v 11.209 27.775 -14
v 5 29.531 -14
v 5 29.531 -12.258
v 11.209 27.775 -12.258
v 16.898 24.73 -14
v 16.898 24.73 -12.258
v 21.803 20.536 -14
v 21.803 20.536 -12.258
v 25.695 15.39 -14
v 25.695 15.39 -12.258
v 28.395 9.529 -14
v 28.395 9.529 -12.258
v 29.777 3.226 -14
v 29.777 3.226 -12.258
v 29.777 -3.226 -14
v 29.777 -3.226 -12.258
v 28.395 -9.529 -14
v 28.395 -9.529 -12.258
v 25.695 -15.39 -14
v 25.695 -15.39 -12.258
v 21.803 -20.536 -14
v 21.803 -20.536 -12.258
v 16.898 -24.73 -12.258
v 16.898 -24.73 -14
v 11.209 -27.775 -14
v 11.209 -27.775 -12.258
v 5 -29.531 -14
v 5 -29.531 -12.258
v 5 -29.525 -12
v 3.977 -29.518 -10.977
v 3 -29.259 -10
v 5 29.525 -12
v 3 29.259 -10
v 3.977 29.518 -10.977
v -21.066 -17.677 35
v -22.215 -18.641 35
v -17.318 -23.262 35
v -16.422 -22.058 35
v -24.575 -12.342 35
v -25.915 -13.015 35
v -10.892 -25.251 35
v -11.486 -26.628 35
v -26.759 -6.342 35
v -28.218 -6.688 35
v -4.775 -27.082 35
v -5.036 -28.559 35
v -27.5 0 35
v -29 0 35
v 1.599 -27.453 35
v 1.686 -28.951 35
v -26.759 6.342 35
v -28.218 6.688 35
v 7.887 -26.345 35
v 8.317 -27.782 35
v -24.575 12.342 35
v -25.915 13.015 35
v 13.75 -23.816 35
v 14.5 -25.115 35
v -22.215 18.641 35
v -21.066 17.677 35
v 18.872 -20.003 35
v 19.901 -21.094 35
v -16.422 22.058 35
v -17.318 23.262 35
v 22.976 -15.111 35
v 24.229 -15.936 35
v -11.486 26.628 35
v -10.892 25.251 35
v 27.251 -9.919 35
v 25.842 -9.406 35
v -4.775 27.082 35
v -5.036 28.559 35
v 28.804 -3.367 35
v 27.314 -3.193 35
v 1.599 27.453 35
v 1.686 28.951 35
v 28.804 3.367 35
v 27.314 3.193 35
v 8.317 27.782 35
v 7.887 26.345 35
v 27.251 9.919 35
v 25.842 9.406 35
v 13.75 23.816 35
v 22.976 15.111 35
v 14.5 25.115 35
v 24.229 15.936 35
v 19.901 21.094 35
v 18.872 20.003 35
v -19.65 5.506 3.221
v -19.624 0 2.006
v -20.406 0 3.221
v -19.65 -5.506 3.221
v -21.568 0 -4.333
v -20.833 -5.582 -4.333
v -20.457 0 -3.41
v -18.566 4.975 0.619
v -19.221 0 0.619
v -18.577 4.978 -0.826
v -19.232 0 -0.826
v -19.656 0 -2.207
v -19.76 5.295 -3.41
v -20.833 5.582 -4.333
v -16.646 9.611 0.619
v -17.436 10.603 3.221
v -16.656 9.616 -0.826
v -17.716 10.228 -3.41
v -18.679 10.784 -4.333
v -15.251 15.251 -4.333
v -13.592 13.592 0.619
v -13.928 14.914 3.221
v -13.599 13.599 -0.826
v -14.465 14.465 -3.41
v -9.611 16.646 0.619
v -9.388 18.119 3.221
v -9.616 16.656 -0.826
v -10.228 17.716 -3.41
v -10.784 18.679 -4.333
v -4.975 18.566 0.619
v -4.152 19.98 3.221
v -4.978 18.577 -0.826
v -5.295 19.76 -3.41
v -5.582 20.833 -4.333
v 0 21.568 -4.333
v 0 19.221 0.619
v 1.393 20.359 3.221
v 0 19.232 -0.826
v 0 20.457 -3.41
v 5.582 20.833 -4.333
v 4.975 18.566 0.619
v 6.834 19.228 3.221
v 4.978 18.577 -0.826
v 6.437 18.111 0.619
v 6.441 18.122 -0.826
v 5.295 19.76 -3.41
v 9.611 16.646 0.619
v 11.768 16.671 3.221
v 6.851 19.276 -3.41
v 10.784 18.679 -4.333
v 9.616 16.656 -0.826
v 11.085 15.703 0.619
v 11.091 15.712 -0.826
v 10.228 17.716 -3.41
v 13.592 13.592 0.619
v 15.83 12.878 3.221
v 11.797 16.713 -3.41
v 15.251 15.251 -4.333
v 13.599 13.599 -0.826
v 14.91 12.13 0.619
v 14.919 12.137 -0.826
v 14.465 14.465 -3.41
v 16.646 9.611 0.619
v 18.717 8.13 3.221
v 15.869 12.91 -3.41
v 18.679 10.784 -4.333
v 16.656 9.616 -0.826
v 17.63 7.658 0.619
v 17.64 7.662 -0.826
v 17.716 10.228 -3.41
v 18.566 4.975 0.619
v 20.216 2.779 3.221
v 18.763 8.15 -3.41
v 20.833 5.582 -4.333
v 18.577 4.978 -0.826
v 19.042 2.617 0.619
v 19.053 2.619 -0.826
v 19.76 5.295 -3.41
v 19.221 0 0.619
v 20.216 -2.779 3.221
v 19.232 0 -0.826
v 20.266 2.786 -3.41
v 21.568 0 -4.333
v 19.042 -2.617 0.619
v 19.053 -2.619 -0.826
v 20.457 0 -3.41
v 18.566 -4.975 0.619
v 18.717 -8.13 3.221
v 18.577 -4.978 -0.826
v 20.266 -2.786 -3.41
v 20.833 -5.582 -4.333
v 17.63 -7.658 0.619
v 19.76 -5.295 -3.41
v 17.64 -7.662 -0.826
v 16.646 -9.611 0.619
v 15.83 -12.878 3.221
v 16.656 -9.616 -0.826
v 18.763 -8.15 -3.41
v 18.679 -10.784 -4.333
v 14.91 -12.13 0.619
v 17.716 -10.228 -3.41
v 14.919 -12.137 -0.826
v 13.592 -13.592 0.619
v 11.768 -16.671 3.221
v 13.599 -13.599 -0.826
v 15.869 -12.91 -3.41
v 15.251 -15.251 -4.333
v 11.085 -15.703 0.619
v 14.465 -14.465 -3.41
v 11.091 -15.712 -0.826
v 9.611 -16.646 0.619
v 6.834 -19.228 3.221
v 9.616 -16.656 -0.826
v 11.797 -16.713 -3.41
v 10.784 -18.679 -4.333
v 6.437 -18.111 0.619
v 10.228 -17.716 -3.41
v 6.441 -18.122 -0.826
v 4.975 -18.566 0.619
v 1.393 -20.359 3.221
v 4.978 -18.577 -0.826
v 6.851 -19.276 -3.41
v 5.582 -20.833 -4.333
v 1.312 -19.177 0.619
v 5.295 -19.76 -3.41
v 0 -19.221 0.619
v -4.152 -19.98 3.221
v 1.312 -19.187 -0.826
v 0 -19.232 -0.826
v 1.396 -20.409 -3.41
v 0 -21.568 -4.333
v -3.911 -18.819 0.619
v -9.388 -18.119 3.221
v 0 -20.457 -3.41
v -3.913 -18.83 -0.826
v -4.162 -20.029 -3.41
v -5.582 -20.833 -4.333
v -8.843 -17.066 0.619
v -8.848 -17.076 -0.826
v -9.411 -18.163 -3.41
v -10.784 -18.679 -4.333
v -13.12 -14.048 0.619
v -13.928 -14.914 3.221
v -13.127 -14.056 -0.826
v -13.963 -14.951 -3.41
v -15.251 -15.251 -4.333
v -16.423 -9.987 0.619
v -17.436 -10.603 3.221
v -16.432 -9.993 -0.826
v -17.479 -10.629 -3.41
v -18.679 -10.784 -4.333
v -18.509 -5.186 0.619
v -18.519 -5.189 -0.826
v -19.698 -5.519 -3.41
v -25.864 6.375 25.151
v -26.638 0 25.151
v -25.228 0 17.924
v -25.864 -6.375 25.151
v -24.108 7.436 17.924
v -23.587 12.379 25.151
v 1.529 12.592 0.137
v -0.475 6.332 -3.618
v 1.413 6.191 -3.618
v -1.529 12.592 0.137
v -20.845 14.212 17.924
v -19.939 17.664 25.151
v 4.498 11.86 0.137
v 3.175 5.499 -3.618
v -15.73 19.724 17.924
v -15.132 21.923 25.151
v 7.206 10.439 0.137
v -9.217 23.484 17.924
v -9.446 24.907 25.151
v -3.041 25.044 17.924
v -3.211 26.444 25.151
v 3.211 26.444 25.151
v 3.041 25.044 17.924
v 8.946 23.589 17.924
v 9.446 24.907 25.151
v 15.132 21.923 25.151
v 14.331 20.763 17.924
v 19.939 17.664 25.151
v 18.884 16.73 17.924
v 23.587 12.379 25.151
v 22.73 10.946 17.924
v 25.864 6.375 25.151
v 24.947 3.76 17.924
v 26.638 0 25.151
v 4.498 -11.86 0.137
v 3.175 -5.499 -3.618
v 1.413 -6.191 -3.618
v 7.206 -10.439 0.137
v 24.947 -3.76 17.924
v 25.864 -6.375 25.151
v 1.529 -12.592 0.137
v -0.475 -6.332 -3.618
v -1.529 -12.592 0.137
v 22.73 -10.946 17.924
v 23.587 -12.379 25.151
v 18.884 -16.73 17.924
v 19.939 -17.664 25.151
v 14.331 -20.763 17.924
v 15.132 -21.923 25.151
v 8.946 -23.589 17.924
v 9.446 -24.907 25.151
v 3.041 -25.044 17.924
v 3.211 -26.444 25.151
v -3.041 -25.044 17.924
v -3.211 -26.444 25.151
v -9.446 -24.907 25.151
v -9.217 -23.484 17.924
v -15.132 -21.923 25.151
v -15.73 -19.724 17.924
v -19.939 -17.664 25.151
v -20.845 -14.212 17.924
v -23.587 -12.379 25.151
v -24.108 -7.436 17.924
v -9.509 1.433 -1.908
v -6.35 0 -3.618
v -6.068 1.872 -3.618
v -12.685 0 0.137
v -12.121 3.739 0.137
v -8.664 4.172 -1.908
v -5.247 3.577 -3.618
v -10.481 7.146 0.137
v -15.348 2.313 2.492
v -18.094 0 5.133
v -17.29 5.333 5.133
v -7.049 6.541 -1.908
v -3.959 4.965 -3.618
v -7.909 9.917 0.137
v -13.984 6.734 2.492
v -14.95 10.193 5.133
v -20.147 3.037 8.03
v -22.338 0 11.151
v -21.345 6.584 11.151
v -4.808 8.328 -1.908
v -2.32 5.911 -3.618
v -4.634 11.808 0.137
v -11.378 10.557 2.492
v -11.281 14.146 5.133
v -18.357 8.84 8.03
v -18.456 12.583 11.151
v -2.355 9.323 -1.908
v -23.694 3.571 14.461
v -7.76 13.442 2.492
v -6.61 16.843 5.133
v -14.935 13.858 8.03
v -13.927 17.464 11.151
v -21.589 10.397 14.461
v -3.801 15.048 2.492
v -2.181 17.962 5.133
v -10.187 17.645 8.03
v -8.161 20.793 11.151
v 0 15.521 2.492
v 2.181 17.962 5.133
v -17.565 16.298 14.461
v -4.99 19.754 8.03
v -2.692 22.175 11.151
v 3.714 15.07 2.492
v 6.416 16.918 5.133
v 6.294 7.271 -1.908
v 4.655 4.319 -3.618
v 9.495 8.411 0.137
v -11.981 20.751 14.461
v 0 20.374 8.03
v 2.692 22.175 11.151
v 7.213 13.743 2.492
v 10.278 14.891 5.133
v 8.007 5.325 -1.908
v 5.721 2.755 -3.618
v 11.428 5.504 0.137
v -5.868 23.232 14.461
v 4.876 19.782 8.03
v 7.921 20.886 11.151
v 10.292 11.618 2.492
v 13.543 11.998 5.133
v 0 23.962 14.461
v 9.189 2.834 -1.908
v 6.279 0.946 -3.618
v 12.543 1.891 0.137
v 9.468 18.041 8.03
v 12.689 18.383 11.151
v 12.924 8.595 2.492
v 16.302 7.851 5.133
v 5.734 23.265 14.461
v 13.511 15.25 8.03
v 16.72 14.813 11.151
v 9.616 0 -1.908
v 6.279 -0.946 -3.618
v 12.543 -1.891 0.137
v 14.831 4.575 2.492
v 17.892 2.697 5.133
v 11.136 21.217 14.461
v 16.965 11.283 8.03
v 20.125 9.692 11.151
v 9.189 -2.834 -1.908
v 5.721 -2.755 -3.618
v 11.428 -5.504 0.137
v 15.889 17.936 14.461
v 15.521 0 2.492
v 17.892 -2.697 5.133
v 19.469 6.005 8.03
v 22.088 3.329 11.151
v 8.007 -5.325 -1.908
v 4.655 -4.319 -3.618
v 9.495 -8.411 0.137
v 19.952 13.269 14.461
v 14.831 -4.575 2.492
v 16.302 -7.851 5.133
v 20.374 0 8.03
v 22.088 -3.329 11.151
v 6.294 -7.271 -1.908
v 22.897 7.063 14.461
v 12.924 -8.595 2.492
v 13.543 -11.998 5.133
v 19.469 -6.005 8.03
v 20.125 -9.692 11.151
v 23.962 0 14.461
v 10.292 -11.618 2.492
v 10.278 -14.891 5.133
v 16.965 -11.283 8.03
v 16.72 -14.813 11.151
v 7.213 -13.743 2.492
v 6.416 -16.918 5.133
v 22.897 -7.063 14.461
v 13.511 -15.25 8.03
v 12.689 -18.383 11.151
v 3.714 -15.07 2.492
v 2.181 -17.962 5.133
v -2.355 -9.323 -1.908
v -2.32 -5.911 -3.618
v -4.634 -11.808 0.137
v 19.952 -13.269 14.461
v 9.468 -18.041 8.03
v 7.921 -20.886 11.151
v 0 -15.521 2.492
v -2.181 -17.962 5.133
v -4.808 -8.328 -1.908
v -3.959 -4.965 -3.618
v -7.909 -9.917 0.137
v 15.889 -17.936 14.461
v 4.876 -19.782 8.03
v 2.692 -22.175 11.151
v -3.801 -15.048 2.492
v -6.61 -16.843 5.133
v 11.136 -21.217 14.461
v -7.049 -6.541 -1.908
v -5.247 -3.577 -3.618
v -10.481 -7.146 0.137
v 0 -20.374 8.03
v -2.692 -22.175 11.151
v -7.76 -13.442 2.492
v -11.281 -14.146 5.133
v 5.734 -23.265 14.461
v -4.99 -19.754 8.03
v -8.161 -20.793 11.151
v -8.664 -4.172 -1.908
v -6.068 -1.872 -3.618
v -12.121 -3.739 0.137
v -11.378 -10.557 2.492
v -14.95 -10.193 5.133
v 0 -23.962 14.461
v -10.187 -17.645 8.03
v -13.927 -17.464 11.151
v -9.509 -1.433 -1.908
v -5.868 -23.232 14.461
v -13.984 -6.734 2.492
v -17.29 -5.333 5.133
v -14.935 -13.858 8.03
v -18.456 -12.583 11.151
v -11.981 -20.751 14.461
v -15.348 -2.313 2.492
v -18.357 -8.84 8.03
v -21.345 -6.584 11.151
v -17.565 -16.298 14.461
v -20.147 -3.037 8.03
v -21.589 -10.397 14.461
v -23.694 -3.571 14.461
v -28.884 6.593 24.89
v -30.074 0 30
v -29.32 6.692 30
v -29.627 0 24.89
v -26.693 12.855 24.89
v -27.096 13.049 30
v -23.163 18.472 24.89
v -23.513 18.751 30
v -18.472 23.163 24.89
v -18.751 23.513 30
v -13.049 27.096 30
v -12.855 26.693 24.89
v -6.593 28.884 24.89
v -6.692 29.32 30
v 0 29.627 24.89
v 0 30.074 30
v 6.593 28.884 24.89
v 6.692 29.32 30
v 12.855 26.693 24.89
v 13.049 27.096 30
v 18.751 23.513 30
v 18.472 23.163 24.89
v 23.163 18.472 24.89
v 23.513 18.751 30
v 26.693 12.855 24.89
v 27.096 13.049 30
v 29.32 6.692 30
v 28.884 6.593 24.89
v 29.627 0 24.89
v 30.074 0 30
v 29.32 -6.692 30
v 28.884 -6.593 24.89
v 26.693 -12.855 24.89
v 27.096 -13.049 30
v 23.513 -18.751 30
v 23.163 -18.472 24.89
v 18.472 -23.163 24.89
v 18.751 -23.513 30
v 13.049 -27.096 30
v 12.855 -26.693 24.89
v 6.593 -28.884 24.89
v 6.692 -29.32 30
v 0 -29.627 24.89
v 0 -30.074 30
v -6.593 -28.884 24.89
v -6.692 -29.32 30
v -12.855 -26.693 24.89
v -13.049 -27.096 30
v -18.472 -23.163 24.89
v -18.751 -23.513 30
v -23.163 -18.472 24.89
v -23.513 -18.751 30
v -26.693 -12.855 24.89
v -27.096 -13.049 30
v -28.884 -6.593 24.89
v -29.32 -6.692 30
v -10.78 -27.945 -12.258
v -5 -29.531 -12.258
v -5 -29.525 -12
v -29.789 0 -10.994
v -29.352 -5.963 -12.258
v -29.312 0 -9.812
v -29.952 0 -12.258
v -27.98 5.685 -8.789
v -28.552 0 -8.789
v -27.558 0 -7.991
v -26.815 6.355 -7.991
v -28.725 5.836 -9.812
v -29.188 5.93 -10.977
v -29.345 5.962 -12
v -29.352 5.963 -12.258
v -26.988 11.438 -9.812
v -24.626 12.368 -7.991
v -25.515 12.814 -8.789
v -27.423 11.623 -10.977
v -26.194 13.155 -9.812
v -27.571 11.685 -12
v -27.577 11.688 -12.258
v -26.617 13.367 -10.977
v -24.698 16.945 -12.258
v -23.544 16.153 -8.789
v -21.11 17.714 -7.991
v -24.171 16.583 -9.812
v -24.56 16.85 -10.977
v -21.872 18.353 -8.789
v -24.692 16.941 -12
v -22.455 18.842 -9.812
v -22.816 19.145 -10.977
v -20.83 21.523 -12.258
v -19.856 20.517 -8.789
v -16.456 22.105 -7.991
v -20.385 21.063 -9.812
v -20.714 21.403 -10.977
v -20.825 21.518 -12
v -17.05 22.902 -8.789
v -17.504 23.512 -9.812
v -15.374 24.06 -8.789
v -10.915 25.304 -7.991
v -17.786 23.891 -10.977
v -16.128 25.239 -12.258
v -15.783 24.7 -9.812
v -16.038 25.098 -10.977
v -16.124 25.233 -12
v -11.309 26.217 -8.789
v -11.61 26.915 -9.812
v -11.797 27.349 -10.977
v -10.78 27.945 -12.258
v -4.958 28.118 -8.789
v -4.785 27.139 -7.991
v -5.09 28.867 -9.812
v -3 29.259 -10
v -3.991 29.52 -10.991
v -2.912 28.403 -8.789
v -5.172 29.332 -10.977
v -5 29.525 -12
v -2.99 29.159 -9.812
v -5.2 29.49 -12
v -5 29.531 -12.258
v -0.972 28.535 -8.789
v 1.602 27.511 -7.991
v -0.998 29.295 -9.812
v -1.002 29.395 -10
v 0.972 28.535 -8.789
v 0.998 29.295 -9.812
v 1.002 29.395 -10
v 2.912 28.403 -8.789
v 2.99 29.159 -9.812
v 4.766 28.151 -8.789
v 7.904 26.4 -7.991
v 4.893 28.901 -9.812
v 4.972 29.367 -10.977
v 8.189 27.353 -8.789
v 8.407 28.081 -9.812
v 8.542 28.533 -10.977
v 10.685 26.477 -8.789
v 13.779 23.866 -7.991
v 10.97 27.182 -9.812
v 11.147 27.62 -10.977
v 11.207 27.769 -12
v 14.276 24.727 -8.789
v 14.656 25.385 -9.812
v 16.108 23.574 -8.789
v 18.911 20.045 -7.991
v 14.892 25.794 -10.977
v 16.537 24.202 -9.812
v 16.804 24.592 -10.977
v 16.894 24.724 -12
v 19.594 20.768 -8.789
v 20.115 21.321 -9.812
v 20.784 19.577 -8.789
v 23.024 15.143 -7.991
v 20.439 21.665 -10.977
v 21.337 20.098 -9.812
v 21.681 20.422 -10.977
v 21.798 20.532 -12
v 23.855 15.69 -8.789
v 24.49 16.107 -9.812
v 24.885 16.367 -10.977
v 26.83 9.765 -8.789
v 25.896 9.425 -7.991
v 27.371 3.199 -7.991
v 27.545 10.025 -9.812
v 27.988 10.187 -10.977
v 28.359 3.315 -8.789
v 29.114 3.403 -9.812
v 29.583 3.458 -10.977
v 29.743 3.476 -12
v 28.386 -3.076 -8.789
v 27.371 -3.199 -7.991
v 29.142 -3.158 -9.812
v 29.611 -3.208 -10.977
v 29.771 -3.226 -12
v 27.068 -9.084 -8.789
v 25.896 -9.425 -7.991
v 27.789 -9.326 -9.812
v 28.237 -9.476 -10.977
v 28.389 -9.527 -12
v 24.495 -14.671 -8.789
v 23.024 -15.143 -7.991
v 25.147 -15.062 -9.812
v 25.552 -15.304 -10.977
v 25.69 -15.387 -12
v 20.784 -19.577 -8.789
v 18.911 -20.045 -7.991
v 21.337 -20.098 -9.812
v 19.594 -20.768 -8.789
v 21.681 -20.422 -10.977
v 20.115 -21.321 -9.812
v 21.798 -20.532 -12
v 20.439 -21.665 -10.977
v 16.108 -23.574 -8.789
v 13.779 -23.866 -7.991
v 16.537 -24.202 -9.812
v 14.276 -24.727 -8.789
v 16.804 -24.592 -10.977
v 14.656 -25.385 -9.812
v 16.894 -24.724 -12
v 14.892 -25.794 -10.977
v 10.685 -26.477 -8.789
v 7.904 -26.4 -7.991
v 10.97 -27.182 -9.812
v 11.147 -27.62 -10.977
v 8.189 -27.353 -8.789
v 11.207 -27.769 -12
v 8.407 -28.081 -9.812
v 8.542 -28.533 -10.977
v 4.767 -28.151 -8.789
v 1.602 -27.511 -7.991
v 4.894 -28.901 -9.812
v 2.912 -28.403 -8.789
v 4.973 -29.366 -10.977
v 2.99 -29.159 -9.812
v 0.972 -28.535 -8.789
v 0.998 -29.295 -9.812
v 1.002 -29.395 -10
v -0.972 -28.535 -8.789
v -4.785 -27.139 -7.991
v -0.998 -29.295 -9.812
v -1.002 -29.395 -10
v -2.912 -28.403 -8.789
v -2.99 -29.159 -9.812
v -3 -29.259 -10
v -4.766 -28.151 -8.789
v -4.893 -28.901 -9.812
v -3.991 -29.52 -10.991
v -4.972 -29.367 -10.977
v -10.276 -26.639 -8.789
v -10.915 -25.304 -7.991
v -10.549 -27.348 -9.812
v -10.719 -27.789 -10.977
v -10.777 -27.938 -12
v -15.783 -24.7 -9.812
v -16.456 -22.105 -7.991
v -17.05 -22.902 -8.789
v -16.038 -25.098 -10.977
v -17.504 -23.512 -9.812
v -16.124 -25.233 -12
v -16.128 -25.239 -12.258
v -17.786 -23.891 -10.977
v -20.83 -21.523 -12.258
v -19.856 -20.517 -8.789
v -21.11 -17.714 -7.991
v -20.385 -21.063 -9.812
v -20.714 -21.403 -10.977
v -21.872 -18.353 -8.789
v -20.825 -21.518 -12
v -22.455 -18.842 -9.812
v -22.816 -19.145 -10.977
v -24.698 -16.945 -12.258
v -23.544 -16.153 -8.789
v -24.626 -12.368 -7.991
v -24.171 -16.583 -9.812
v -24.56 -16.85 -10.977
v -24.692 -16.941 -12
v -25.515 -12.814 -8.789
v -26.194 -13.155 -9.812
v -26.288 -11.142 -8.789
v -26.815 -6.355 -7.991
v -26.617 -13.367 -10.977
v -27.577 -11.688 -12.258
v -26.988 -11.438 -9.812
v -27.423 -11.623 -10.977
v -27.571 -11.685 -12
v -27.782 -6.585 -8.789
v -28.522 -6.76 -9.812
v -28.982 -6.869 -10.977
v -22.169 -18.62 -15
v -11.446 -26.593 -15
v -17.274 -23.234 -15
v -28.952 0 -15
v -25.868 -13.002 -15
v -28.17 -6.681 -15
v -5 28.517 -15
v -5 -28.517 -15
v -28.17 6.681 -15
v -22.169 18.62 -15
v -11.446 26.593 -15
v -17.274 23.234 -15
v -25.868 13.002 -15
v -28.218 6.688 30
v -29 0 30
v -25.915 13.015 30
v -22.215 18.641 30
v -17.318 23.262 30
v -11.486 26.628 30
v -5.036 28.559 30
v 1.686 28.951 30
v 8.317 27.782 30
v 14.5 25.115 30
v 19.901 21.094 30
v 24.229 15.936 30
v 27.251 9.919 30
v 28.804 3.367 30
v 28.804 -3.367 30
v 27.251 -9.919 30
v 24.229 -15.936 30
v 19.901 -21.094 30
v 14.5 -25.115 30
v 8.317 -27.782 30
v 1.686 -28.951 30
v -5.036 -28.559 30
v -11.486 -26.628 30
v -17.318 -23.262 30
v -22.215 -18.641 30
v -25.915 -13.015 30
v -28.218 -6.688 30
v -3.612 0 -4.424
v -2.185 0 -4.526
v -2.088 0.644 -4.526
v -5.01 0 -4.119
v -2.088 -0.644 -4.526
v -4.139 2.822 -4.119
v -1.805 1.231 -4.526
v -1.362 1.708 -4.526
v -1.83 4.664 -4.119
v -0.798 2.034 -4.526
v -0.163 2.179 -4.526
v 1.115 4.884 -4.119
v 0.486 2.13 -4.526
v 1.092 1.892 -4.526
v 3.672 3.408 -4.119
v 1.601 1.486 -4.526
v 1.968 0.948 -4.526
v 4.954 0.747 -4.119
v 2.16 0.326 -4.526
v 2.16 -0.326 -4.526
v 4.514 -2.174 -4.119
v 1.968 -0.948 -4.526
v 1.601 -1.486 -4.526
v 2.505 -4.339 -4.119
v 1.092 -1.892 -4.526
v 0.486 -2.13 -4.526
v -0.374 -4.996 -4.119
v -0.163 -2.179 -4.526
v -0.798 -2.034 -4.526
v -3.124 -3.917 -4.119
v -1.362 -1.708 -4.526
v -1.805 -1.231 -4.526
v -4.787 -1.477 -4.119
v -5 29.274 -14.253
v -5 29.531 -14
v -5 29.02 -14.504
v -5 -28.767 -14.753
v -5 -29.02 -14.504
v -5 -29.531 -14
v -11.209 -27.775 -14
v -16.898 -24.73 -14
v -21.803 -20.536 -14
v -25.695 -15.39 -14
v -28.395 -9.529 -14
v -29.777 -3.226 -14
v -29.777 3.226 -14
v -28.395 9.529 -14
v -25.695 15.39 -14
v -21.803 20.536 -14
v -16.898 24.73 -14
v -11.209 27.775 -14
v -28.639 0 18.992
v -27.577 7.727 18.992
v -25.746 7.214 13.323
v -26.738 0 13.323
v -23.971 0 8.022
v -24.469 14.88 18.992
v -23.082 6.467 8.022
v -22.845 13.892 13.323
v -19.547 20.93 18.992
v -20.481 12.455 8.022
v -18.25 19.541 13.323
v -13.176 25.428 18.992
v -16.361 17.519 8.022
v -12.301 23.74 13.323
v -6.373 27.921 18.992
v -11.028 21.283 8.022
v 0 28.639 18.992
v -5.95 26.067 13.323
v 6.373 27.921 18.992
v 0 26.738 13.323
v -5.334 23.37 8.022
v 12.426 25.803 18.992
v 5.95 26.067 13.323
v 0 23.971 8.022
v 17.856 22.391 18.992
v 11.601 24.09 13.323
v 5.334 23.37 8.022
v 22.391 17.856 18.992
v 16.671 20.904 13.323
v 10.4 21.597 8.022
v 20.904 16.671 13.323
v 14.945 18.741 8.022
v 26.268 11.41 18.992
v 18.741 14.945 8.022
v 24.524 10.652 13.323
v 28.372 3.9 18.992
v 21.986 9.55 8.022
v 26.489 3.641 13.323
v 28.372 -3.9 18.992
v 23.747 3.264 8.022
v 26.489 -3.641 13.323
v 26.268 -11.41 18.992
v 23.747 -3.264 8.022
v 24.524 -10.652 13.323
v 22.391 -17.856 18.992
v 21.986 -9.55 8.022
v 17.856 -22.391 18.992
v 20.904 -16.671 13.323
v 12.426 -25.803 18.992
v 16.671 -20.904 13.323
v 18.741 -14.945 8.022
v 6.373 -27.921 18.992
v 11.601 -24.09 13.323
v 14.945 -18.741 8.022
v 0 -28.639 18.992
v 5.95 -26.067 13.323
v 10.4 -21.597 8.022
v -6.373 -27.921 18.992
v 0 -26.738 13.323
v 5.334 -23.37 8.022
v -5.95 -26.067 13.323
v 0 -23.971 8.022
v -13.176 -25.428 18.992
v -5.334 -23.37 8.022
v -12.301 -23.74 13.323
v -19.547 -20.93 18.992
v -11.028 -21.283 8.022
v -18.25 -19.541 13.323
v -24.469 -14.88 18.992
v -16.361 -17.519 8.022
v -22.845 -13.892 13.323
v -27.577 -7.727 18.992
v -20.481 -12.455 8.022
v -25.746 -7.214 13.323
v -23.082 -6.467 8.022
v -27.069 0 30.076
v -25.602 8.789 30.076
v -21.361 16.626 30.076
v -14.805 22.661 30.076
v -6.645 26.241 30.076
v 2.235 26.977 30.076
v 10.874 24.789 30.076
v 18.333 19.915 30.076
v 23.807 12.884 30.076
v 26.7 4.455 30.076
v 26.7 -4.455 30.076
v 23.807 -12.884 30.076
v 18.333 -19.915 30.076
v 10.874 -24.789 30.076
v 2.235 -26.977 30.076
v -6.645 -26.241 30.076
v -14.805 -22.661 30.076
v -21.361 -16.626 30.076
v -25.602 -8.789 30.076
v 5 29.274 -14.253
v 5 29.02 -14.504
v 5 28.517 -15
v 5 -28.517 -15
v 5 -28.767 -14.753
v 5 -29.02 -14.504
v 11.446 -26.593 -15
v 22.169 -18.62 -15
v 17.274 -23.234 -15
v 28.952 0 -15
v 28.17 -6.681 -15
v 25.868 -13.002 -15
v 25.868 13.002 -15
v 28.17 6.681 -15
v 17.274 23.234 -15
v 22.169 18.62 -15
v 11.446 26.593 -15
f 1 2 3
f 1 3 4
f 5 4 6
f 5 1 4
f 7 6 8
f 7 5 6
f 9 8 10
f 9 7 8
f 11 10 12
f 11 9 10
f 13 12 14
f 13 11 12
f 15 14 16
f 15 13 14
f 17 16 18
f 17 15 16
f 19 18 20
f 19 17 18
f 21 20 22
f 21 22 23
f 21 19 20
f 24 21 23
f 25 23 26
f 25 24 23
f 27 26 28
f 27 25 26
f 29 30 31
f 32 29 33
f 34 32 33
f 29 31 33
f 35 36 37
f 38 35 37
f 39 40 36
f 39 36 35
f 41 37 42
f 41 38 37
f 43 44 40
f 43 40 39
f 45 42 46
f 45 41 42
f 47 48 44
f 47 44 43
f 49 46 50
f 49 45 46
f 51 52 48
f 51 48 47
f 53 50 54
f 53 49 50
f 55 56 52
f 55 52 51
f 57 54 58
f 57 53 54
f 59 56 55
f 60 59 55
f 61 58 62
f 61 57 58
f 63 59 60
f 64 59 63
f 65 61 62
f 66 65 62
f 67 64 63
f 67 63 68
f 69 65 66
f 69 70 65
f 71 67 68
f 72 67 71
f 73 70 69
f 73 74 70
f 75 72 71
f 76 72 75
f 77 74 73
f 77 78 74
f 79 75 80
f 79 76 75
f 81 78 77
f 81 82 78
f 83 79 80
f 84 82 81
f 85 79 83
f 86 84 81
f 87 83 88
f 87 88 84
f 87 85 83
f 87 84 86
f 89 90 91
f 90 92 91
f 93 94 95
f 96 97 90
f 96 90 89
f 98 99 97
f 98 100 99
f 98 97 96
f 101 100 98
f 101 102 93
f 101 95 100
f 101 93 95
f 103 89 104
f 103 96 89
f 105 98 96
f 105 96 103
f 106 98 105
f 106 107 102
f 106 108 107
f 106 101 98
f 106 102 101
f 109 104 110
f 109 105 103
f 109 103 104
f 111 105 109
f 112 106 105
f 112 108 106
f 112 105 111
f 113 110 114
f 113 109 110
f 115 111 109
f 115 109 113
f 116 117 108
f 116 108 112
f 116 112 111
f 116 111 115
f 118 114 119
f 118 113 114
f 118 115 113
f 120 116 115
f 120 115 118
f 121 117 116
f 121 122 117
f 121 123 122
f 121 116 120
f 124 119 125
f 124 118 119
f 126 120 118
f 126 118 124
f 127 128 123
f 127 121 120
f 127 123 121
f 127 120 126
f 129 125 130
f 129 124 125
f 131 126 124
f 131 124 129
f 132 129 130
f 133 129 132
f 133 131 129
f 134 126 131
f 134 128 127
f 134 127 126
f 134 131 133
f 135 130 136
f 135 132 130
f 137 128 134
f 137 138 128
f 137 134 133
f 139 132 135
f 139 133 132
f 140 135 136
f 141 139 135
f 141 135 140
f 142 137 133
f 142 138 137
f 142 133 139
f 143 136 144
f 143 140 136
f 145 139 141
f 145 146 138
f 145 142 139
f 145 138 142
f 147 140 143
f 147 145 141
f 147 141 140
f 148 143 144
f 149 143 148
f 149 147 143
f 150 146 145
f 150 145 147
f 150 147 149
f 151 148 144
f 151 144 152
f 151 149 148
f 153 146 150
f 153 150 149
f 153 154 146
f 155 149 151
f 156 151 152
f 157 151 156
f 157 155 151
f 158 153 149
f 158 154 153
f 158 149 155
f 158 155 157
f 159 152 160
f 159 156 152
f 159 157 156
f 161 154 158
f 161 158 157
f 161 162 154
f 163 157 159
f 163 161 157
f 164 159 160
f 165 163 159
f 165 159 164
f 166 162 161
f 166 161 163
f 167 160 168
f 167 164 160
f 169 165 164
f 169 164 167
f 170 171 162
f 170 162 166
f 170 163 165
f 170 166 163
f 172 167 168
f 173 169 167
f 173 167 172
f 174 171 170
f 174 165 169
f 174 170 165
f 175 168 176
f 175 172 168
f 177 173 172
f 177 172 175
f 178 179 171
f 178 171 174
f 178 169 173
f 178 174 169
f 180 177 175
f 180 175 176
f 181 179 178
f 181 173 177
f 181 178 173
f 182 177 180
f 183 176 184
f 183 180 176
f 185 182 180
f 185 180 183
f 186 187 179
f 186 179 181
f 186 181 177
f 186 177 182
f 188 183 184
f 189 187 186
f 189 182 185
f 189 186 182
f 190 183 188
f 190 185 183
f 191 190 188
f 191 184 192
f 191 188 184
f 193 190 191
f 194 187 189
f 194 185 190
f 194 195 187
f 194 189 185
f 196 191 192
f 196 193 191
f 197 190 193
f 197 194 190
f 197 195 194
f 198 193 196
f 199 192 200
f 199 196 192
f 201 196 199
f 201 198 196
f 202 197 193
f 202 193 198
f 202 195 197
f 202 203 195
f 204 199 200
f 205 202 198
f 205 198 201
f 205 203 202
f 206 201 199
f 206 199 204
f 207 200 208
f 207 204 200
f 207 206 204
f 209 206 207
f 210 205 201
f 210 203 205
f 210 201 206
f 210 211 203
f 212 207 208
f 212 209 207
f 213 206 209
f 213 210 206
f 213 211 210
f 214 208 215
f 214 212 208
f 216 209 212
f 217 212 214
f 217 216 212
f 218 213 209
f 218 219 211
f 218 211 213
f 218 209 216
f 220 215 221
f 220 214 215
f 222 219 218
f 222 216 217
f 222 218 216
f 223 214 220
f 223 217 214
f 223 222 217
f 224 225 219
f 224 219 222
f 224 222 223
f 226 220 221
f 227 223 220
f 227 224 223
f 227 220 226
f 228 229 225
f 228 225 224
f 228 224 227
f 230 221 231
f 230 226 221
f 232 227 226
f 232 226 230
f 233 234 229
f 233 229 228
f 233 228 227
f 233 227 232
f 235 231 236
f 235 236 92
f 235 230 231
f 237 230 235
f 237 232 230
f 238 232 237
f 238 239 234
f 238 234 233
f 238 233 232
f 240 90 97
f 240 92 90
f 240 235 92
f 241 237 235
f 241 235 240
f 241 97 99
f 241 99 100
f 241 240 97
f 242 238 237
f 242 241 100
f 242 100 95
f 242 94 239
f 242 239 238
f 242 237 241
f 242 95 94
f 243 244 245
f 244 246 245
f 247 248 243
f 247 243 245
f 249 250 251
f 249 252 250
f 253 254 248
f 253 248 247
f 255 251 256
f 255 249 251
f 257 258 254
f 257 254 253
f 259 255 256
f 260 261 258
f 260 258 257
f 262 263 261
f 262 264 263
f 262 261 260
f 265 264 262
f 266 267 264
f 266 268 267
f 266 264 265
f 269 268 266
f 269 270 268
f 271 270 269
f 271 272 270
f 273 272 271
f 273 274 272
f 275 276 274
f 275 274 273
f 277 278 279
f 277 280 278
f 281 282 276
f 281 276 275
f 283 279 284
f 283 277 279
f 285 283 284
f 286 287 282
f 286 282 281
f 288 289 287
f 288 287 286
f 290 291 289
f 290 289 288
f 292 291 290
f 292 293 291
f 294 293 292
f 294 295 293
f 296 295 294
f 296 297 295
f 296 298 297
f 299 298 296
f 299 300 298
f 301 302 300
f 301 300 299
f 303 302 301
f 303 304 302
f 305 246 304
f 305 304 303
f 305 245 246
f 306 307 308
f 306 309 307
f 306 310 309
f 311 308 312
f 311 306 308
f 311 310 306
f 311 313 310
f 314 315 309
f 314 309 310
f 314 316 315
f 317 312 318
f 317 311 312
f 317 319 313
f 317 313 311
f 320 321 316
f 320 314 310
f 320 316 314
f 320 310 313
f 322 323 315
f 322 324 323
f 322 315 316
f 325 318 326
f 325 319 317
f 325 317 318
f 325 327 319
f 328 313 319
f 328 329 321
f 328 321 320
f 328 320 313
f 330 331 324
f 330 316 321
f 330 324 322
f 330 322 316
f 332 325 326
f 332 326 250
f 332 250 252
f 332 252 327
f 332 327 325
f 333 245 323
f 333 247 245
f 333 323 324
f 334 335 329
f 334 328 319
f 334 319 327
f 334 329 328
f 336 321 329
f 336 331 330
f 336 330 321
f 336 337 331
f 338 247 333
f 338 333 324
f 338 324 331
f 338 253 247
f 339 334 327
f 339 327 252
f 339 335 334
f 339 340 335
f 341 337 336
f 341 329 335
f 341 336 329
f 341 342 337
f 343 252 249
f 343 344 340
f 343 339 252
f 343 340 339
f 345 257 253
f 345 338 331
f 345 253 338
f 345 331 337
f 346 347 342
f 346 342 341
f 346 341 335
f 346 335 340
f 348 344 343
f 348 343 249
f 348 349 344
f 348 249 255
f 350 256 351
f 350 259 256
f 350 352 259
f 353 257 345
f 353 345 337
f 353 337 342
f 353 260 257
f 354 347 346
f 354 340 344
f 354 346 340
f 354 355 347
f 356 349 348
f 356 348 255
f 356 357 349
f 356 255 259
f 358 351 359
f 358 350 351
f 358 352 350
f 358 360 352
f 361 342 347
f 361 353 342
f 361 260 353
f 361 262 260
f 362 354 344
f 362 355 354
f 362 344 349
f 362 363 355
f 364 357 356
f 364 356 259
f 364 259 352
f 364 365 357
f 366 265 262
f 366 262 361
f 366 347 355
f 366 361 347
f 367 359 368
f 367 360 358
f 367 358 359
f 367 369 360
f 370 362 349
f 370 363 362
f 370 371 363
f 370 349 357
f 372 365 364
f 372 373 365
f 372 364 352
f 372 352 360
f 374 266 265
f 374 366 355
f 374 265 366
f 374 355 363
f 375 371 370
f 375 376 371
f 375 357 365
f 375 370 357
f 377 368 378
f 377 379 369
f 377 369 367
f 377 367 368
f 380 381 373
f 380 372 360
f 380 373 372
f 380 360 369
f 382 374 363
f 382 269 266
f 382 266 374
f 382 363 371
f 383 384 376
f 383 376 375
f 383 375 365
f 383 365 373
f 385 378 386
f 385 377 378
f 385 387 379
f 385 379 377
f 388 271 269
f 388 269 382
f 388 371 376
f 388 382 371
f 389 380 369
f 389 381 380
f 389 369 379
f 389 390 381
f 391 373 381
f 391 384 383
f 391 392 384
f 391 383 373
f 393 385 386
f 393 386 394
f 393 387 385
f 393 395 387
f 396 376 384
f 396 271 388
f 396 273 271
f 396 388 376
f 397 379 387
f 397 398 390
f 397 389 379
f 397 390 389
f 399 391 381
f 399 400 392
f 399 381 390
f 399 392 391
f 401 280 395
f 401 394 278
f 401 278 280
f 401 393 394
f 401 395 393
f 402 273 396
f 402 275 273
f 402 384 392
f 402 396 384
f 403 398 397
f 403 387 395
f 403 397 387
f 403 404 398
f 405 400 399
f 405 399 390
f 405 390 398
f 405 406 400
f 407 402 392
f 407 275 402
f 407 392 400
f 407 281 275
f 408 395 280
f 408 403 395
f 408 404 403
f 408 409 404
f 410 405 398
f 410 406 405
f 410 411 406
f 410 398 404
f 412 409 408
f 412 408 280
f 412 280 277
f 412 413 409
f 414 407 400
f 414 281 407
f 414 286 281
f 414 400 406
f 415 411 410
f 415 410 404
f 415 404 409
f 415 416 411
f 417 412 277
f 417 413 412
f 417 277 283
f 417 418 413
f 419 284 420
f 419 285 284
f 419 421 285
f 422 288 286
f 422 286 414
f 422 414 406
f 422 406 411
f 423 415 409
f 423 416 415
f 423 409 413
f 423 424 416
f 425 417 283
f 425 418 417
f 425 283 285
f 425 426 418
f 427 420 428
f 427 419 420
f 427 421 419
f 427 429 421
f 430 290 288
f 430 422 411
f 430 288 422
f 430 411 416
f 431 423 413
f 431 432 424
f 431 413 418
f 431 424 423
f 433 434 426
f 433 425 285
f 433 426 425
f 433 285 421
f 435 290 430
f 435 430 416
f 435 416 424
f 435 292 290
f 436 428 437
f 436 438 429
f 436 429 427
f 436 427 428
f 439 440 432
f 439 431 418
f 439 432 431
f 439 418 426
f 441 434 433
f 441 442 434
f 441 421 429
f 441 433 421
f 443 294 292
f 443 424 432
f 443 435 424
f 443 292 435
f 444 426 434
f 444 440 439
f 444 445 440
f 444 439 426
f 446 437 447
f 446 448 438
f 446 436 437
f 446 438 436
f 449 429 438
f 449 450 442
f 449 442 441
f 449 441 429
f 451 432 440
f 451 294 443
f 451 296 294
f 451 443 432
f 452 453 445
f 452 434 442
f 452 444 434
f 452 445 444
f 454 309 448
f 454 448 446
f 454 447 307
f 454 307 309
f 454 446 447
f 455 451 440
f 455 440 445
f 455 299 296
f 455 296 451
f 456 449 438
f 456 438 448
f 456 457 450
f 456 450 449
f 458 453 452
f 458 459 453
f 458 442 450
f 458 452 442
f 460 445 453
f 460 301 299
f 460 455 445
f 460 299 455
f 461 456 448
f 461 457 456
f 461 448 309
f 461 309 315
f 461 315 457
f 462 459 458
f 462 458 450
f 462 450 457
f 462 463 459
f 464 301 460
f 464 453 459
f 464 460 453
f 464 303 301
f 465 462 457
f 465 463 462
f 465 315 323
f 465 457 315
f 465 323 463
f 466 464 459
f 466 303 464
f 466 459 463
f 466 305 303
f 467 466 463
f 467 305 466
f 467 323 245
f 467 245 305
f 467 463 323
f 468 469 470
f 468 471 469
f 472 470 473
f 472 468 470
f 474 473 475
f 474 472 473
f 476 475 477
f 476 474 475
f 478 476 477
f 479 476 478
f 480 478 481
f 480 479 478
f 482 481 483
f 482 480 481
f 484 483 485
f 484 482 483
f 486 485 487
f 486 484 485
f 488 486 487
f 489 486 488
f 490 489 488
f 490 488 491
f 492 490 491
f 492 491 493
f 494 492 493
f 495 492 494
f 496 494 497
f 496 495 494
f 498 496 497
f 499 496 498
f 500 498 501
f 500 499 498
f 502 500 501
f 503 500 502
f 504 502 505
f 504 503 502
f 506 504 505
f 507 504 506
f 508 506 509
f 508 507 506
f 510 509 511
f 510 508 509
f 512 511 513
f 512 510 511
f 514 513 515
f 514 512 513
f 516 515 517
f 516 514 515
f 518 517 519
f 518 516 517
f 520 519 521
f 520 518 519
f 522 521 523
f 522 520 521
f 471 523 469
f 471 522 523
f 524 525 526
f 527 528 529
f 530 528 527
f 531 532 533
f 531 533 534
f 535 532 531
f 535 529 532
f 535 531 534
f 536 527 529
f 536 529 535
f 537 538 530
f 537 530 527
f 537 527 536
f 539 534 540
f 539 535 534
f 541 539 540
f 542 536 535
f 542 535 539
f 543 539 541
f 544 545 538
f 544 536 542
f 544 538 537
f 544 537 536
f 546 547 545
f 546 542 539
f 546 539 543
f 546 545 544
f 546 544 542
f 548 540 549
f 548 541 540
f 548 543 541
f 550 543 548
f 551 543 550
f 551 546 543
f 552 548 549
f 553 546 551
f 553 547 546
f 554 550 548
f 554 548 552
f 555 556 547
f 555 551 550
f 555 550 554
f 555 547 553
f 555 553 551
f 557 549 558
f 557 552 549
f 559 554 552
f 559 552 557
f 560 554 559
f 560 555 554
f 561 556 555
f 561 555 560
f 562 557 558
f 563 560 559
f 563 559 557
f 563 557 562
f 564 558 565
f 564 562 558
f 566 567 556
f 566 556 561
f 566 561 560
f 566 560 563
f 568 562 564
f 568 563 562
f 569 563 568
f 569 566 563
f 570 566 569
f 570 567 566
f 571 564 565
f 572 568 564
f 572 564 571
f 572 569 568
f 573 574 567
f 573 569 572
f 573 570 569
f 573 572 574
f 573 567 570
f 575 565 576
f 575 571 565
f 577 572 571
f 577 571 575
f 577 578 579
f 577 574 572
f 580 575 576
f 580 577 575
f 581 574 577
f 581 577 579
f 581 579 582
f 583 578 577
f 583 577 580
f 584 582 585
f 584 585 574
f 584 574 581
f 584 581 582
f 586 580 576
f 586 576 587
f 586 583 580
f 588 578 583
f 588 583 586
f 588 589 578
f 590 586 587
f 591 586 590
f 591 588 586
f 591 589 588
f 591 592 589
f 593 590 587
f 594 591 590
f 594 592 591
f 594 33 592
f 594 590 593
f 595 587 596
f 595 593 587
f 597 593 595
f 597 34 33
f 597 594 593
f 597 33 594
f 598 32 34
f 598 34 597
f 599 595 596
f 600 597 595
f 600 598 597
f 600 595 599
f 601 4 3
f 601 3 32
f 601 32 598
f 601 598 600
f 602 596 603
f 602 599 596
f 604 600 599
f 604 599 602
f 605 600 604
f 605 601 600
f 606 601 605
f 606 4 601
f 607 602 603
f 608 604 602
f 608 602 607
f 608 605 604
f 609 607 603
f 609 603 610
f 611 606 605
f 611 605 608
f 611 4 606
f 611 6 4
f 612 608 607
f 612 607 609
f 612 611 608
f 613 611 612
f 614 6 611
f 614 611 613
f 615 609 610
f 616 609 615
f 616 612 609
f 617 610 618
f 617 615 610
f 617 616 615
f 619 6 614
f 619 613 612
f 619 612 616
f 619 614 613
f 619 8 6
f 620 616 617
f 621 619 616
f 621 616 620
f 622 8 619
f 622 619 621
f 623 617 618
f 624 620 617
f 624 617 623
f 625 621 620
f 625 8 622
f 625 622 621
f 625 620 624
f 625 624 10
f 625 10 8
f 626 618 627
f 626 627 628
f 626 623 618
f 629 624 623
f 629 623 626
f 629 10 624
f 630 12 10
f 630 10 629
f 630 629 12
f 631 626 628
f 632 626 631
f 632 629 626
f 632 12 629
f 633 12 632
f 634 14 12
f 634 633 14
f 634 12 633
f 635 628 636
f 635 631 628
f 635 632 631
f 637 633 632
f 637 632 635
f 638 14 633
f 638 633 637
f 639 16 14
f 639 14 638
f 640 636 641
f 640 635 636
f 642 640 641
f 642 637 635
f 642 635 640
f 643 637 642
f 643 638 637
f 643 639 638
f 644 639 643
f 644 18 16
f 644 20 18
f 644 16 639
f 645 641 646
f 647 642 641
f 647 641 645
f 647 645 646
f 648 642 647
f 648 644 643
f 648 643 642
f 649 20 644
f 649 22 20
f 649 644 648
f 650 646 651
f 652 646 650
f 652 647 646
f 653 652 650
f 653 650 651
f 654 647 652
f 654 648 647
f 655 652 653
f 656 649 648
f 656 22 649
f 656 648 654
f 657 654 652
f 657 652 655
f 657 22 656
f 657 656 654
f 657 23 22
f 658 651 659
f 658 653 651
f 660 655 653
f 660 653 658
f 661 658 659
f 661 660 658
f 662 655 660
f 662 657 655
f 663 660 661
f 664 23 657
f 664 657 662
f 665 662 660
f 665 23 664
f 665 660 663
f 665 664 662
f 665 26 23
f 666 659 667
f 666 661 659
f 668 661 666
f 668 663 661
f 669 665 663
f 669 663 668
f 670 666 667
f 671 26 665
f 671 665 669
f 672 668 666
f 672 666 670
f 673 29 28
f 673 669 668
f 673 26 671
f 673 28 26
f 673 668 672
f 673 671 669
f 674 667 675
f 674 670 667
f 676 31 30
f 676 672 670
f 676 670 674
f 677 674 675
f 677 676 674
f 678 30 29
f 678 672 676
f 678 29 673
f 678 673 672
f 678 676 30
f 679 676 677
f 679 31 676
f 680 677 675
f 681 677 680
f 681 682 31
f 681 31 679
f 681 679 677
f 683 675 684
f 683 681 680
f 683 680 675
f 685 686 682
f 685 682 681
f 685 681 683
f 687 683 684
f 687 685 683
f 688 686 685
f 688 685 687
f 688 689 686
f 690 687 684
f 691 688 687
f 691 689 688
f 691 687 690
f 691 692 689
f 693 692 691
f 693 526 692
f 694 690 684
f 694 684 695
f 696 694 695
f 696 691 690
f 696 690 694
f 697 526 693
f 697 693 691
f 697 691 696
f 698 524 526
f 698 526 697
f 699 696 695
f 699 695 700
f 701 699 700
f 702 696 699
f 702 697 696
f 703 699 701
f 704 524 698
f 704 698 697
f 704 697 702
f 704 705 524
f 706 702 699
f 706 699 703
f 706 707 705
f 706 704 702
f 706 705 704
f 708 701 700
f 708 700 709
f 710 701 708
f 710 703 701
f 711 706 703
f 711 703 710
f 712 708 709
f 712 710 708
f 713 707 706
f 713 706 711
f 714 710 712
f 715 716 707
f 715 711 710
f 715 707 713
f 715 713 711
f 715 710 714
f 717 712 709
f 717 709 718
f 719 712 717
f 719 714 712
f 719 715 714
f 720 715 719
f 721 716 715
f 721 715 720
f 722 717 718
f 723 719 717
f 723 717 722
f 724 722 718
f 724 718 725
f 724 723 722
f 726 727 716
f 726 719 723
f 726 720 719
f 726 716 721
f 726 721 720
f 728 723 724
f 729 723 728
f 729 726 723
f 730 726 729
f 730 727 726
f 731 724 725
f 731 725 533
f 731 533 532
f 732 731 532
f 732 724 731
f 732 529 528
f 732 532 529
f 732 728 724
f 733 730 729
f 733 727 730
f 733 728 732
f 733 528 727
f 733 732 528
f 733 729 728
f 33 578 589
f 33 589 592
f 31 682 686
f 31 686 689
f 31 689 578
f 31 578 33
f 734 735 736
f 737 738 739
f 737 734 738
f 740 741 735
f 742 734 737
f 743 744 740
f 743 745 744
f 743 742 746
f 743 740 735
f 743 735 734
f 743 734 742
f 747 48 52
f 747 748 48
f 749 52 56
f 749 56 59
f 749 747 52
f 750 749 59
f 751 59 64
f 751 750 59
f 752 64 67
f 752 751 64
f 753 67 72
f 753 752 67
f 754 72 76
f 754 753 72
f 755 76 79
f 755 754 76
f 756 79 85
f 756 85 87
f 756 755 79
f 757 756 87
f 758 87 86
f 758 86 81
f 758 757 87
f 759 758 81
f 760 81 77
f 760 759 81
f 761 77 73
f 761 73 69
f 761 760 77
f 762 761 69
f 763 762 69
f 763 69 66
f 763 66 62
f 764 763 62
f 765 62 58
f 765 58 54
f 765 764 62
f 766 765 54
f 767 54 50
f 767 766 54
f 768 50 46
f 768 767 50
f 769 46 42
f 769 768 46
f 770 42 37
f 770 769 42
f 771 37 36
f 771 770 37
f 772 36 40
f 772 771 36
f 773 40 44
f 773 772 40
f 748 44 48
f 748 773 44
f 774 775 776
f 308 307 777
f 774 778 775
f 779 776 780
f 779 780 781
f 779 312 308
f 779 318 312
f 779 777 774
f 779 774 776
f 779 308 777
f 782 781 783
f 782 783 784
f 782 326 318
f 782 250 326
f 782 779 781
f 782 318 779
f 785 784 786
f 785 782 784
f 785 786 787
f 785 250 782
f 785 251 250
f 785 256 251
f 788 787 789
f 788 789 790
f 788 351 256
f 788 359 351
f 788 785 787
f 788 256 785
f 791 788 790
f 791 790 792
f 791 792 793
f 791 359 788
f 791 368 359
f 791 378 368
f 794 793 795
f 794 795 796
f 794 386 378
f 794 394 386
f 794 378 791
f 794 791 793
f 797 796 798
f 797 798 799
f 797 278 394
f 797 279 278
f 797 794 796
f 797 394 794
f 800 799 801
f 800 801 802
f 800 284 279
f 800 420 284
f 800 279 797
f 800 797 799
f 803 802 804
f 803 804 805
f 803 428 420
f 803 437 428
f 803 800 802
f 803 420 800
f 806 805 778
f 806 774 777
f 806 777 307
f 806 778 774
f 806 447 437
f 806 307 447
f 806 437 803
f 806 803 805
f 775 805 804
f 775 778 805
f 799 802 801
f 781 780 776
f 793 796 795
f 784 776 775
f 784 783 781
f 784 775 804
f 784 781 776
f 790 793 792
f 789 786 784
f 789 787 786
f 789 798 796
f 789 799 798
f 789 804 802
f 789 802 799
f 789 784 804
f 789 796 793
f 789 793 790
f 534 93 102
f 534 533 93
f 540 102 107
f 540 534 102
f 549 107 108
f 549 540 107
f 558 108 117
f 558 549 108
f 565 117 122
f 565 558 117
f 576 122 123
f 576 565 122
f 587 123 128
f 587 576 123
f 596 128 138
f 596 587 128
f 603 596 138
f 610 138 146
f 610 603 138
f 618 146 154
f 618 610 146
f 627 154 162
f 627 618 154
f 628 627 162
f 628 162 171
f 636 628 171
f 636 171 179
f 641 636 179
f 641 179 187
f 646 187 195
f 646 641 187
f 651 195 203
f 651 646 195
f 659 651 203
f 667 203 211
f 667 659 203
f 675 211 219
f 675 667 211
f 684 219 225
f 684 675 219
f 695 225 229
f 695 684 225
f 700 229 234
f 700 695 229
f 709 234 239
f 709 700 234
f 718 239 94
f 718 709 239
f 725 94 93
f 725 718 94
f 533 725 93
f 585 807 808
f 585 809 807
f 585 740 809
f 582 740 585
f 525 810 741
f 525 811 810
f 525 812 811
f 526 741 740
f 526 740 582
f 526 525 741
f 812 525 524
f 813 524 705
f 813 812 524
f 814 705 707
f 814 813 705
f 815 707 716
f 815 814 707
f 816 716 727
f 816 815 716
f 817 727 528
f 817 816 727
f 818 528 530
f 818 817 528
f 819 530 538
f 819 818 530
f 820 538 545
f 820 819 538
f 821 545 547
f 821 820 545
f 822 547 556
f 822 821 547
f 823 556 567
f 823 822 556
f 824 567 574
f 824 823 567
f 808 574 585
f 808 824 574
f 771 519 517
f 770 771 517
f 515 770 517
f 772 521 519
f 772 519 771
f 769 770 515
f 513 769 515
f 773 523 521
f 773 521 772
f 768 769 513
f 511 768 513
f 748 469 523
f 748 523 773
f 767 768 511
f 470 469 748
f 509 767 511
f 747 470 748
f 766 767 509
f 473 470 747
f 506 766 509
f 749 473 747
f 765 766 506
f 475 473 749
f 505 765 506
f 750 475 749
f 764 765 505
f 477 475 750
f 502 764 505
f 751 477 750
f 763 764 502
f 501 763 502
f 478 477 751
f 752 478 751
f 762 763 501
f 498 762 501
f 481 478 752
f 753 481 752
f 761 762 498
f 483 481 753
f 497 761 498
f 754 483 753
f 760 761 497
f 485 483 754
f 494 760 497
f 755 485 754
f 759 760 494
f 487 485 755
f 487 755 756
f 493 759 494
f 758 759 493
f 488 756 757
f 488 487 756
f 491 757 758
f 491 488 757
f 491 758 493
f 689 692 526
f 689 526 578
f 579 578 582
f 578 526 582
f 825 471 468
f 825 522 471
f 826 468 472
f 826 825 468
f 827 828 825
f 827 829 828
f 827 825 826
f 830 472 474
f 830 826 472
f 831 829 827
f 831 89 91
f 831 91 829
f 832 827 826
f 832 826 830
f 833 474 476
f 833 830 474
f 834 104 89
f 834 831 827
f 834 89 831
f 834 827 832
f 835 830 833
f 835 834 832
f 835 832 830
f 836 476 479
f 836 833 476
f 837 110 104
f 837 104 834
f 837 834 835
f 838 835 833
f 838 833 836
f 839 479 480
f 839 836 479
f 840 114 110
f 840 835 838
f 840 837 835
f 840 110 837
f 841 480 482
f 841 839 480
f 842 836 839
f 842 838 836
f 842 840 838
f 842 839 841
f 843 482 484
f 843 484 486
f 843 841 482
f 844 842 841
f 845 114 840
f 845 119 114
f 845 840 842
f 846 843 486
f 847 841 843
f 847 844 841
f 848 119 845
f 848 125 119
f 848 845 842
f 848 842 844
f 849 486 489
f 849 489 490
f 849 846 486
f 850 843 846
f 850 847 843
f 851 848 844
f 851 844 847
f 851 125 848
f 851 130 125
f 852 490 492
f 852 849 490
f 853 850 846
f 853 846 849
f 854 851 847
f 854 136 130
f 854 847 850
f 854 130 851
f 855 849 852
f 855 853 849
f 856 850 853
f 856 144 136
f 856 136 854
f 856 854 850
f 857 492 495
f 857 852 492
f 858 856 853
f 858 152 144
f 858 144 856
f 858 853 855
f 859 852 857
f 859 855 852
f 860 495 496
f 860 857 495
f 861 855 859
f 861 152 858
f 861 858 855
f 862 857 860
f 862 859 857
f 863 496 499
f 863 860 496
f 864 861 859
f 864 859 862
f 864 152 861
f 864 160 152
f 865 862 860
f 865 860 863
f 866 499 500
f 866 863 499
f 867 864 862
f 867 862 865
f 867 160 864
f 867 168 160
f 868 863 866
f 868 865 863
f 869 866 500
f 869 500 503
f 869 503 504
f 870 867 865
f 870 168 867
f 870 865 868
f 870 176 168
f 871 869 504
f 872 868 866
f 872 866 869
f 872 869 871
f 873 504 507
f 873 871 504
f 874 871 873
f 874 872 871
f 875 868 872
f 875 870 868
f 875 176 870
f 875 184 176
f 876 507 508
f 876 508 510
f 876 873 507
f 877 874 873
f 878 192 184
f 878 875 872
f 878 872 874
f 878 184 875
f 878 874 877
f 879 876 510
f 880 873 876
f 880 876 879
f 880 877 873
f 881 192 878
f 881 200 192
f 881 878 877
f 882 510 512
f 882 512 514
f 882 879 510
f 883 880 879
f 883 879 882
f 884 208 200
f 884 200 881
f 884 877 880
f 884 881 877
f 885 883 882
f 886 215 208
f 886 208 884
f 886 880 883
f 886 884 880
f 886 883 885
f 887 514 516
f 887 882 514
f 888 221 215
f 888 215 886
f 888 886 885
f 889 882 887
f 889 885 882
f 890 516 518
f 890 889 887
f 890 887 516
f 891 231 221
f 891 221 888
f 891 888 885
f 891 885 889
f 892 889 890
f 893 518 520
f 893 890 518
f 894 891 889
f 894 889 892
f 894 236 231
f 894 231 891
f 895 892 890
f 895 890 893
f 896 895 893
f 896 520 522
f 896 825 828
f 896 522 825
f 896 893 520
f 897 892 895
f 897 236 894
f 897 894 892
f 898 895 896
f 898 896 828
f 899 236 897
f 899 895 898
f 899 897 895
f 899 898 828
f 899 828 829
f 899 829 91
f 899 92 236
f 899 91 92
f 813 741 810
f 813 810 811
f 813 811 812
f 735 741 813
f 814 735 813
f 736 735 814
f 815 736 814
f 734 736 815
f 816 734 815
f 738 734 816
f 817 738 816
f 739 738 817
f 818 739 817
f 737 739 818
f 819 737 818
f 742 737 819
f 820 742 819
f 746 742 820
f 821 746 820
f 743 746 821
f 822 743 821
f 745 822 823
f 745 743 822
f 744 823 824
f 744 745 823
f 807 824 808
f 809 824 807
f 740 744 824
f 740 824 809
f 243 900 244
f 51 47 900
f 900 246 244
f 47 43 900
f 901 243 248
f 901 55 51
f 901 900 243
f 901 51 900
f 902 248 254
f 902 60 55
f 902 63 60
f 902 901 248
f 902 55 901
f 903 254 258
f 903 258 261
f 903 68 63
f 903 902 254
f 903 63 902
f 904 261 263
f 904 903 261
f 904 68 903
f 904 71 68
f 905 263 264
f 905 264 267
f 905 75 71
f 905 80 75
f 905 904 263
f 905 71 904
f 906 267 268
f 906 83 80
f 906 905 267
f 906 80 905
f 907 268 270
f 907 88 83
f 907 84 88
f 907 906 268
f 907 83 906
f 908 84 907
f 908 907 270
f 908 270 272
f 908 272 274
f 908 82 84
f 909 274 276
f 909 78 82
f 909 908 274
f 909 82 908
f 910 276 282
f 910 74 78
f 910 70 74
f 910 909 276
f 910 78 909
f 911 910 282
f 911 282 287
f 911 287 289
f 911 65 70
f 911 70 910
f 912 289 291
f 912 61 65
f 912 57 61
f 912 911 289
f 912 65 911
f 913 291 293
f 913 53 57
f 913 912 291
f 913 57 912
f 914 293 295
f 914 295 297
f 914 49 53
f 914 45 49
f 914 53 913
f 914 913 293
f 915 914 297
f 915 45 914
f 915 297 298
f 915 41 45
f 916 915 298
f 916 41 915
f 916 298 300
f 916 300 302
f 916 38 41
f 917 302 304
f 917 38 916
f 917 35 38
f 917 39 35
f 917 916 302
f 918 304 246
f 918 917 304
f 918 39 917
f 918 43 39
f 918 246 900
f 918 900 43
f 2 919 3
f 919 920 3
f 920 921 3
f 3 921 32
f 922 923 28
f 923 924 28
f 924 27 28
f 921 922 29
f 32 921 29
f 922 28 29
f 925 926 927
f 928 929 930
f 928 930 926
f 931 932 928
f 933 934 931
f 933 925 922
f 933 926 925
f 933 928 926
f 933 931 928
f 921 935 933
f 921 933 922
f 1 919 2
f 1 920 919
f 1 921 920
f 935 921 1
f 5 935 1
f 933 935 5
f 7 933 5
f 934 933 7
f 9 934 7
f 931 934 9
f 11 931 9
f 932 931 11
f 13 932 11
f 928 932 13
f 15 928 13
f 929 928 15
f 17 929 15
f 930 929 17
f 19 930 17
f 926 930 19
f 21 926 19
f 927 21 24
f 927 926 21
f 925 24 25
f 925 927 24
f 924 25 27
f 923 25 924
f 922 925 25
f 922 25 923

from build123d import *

# Parameters (mm, degrees)
F2_W     = 10
F2_H     = 10.684083
F3_DEPTH = 40.5
F4_SIZE  = 2


with BuildPart() as f1:
    # F0 (on Front) → F1 (revolve)
    with BuildSketch(Plane.XZ):
        with BuildLine():
            ThreePointArc((-6.349949, -3.617726), (-20.37432, 8.030333), (-26.638337, 25.151149))
            Line((-26.638337, 25.151149), (-27.5, 35))
            Line((-27.5, 35), (-29, 35))
            Line((-29, 35), (-29, 30))
            Line((-29, 30), (-30.074017, 30))
            Line((-30.074017, 30), (-29.626922, 24.889682))
            ThreePointArc((-29.626922, 24.889682), (-26.737592, 13.322956), (-20.406444, 3.220781))
            ThreePointArc((-20.406444, 3.220781), (-19.232291, -0.826148), (-21.56813, -4.333301))
            Line((-21.56813, -4.333301), (-27.557738, -7.991337))
            ThreePointArc((-27.557738, -7.991337), (-29.31231, -9.812077), (-29.951671, -12.258469))
            Line((-29.951671, -12.258469), (-29.951671, -14))
            Line((-29.951671, -14), (-28.951671, -15))
            Line((-28.951671, -15), (0, -15))
            Line((0, -15), (0, -4.52649))
            Line((0, -4.52649), (-2.184685, -4.52649))
            ThreePointArc((-2.184685, -4.52649), (-4.316309, -4.296658), (-6.349949, -3.617726))
        make_face()
    revolve(axis=Axis((0, 0, -9.763245), (0, 0, -1)))

    # F2 (on Front) → F3 (cut, symmetric)
    with BuildSketch(Plane.XZ):
        with Locations((0, -15.342041)):
            Rectangle(F2_W, F2_H)
    extrude(amount=F3_DEPTH, both=True, mode=Mode.SUBTRACT)

    # F4
    f4_edges = [f1.edges().sort_by_distance(p)[0] for p in [
        (-5, 0, -10),
        (5, 0, -10),
    ]]
    chamfer(f4_edges, length=F4_SIZE)


solid = f1.part
